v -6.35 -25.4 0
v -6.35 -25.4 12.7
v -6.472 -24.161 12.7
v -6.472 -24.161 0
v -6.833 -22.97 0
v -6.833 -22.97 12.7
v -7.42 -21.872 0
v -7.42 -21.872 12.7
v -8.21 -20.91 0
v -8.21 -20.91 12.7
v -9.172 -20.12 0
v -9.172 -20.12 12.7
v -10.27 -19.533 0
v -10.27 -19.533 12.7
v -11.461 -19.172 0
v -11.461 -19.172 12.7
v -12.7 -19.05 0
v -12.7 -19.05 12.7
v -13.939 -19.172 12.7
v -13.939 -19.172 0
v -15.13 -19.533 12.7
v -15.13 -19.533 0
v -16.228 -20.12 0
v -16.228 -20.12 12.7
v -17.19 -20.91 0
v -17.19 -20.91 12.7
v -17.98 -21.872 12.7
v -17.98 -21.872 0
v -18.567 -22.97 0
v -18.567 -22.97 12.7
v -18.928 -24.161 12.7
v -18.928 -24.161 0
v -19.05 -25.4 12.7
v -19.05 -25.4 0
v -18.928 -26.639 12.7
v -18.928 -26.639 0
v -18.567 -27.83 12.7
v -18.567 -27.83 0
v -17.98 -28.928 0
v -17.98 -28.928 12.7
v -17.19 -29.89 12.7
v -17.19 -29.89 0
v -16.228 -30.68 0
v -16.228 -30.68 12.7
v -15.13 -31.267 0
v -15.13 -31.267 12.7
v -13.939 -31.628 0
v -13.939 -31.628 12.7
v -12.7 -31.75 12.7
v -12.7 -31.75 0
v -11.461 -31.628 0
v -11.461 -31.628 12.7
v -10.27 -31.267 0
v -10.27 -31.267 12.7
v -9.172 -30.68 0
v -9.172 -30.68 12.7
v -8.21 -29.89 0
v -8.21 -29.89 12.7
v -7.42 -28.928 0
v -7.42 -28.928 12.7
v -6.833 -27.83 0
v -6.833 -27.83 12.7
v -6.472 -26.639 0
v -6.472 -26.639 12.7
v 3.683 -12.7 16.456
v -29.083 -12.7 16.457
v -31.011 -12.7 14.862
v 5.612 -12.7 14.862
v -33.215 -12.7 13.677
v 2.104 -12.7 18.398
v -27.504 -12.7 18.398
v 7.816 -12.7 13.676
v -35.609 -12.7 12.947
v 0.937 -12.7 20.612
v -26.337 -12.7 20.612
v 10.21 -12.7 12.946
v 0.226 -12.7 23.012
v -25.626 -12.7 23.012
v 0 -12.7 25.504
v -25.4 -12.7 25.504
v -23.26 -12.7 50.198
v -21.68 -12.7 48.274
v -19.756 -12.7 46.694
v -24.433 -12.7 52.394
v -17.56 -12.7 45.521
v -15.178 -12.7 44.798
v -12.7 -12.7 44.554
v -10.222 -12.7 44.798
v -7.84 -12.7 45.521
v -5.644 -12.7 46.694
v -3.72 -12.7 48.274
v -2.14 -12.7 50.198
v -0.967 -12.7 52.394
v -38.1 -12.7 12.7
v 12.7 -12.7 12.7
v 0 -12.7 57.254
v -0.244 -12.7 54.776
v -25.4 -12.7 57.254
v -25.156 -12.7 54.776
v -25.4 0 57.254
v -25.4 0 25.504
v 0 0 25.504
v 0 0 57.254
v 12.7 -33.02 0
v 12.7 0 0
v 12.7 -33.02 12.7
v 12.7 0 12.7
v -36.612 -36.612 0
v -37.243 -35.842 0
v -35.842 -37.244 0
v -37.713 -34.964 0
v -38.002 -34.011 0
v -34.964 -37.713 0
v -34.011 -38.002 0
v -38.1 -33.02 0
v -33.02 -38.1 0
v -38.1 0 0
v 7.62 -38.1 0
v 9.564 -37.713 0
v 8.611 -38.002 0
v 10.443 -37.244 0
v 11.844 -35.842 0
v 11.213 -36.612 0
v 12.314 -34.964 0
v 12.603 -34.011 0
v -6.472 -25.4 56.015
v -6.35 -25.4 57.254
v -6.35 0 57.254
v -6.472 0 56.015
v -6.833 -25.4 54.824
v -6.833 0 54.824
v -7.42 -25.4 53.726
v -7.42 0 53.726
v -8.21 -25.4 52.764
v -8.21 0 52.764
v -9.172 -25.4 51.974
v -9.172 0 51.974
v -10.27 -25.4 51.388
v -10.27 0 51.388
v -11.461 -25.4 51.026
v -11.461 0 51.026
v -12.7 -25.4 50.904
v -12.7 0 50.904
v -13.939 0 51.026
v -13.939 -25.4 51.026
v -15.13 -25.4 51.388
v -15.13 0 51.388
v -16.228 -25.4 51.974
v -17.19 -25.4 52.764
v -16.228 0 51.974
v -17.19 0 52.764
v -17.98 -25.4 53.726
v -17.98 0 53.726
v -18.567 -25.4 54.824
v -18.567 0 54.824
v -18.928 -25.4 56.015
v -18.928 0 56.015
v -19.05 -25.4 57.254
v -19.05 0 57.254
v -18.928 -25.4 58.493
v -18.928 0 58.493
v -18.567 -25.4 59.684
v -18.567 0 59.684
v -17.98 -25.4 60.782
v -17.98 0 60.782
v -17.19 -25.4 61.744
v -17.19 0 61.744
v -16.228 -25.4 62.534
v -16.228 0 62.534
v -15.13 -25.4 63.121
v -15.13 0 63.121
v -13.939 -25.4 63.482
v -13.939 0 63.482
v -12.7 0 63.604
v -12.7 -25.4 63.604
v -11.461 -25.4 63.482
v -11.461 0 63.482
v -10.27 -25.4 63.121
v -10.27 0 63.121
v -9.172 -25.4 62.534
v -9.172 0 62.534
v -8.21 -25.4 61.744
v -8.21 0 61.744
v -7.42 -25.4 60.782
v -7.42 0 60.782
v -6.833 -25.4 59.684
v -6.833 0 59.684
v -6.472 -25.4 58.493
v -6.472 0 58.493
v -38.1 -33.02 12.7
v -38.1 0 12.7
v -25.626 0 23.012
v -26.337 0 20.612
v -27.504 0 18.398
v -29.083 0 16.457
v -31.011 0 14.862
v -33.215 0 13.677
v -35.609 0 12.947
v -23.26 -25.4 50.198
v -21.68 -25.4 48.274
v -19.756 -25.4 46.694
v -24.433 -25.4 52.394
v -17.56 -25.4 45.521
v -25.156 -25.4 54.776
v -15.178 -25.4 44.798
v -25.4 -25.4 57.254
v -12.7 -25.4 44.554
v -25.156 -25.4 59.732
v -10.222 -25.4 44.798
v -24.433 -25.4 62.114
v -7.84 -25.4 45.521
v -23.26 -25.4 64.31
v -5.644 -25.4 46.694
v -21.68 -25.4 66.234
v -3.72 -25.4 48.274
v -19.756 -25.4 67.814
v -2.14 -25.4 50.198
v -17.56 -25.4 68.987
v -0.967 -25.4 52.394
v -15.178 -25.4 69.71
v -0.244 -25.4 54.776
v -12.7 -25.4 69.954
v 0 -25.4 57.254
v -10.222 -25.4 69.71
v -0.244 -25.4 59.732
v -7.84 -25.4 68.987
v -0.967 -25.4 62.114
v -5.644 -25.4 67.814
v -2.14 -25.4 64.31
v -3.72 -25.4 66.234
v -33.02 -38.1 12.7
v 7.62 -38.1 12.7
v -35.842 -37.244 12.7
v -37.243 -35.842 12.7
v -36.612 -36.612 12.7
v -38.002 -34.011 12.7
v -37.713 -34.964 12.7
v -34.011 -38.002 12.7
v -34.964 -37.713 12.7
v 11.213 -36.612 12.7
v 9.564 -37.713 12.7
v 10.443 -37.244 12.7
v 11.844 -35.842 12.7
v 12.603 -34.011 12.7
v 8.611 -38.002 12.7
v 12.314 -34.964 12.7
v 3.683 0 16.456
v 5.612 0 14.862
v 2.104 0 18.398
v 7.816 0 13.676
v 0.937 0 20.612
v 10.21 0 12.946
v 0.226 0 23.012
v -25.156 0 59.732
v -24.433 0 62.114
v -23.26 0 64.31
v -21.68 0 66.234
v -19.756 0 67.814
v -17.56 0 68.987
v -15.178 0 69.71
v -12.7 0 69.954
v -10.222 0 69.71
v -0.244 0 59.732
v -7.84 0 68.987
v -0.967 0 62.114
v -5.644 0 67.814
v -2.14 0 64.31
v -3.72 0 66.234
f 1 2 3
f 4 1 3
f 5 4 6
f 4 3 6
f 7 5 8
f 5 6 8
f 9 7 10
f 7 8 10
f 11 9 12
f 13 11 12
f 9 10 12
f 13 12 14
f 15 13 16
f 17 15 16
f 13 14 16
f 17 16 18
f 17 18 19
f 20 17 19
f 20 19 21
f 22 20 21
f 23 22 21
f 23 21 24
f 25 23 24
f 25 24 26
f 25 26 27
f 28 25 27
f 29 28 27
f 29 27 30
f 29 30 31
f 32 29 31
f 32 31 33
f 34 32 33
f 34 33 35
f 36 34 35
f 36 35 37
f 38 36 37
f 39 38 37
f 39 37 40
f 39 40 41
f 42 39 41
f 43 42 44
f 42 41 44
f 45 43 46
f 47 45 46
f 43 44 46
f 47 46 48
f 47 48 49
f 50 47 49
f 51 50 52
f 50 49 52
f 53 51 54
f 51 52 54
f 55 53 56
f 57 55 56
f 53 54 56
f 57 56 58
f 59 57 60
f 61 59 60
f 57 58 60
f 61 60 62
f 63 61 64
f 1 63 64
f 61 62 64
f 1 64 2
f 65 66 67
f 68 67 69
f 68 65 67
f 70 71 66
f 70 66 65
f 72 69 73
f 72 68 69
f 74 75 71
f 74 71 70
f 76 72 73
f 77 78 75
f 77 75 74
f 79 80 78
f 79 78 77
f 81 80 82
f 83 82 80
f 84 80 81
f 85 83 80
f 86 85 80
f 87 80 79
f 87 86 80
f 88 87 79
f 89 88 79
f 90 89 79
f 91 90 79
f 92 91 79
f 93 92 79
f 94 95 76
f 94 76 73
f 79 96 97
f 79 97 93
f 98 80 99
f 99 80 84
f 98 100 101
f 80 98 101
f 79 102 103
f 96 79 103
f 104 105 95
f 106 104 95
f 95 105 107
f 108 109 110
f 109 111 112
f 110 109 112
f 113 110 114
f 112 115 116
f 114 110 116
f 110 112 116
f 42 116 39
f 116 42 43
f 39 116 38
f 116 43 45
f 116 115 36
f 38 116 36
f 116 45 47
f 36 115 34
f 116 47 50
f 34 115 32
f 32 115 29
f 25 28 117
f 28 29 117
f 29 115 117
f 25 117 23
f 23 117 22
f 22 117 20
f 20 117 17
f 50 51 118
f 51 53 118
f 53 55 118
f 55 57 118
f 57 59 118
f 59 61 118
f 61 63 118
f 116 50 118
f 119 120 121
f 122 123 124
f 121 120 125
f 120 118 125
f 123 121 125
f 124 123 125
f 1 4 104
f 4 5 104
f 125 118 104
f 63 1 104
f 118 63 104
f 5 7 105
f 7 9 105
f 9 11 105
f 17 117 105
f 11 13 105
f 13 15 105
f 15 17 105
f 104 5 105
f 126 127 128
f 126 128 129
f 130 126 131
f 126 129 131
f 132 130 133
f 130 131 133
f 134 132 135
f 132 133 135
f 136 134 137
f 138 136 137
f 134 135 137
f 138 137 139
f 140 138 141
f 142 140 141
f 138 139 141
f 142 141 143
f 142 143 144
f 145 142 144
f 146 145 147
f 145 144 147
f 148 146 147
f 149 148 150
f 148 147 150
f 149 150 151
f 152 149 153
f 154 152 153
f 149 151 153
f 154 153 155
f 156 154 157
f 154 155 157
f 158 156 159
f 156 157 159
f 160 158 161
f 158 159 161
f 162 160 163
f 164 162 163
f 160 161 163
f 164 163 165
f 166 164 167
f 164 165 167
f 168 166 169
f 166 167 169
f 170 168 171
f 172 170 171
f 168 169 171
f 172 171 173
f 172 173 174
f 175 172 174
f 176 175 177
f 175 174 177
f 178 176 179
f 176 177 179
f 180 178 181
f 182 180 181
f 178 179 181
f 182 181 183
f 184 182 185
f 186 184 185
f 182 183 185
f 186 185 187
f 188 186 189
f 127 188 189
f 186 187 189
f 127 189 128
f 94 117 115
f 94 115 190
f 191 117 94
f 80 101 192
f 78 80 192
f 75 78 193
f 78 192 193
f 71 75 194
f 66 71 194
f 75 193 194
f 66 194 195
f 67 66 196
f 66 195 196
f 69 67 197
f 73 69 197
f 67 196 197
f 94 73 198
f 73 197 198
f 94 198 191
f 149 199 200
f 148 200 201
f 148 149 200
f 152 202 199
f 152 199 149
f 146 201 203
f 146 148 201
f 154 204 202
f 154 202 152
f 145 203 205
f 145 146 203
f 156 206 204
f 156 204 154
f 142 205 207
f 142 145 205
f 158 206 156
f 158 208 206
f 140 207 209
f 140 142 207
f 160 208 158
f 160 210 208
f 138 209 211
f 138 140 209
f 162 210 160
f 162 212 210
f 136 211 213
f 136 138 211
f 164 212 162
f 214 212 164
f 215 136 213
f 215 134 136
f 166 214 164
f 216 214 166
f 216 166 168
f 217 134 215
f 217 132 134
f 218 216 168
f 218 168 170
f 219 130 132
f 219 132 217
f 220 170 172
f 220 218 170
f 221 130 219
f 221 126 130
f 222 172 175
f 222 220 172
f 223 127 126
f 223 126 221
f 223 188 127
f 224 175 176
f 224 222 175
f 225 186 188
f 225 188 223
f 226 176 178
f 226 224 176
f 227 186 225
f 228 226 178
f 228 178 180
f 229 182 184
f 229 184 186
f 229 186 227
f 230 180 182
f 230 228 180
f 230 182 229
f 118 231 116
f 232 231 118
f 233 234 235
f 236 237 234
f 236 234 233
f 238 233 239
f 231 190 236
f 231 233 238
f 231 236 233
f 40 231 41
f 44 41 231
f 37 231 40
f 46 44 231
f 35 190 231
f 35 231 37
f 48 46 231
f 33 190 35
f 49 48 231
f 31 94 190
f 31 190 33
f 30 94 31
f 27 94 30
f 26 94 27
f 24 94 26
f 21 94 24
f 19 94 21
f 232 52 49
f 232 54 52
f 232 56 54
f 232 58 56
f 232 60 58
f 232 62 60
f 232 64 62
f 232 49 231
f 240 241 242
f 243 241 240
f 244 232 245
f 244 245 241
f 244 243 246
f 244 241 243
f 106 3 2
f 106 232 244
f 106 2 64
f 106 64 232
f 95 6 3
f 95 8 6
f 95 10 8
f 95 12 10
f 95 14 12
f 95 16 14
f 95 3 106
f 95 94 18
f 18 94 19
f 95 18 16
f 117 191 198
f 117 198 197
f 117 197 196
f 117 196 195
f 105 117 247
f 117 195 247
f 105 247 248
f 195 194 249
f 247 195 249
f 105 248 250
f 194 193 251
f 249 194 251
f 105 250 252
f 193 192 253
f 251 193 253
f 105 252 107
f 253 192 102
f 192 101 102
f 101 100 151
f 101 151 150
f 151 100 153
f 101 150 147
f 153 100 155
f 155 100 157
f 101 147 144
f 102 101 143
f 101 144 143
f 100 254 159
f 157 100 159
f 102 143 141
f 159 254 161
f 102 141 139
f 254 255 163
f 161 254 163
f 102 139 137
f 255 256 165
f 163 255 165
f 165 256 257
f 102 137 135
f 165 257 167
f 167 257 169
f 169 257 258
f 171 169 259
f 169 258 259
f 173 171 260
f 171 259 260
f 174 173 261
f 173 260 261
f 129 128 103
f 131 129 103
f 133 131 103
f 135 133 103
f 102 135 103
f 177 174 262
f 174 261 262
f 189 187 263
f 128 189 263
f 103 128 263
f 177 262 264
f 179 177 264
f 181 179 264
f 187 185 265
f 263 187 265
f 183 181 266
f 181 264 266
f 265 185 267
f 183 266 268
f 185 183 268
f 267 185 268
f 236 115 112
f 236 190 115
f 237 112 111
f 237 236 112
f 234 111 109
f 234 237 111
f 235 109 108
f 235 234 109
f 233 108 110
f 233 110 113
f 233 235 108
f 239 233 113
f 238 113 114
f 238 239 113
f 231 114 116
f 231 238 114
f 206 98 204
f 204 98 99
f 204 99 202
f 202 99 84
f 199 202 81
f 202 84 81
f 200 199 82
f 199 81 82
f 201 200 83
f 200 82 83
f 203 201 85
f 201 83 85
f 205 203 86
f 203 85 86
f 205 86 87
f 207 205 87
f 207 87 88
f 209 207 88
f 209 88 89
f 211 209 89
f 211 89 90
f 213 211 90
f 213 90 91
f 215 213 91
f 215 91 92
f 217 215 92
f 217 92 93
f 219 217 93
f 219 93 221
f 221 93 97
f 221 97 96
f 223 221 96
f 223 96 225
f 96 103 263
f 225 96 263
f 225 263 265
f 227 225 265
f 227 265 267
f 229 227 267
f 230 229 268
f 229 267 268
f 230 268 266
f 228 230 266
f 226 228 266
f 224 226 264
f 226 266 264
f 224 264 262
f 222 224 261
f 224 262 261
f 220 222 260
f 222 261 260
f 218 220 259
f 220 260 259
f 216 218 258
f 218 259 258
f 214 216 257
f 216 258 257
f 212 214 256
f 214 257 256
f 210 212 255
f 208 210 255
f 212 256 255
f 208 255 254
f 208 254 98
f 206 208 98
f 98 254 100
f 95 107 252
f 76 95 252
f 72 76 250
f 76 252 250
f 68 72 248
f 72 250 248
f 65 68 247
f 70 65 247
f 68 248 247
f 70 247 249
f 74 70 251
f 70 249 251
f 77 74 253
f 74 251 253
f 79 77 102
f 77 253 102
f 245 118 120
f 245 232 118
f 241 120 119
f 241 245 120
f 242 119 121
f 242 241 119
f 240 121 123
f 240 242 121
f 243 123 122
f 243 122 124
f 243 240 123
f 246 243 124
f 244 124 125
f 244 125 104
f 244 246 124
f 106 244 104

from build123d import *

# Parameters (mm, degrees)
F1_DEPTH = 25.4
F2_DEPTH = 12.7
F0_W     = 50.8
F0_H     = 12.7
F3_DEPTH = 38.1
F4_R     = 6.35
F5_DEPTH = 12.701
F6_R     = 5.08


with BuildPart() as f1:
    # F0 (on Front) → F1 (new body)
    with BuildSketch(Plane.XZ):
        with BuildLine():
            ThreePointArc((0, 57.254138), (-12.7, 69.954138), (-25.4, 57.254138))
            Line((-25.4, 57.254138), (-19.05, 57.254138))
            ThreePointArc((-19.05, 57.254138), (-12.7, 63.604138), (-6.35, 57.254138))
            Line((-6.35, 57.254138), (0, 57.254138))
        make_face()
        with BuildLine():
            Line((-19.05, 57.254138), (-25.4, 57.254138))
            ThreePointArc((-25.4, 57.254138), (-12.7, 44.554138), (0, 57.254138))
            Line((0, 57.254138), (-6.35, 57.254138))
            ThreePointArc((-6.35, 57.254138), (-12.7, 50.904138), (-19.05, 57.254138))
        make_face()
    extrude(amount=F1_DEPTH)

    # F0 (on Front) → F2 (join)
    with BuildSketch(Plane.XZ):
        with BuildLine():
            ThreePointArc((-25.4, 25.504138), (-29.082574, 16.456638), (-38.099573, 12.7))
            Line((-38.099573, 12.7), (12.700427, 12.7))
            ThreePointArc((12.700427, 12.7), (3.682874, 16.456335), (0, 25.504138))
            Line((0, 25.504138), (0, 57.254138))
            ThreePointArc((0, 57.254138), (-12.7, 44.554138), (-25.4, 57.254138))
            Line((-25.4, 57.254138), (-25.4, 25.504138))
        make_face()
    extrude(amount=F2_DEPTH)

    # F0 (on Front) → F3 (join)
    with BuildSketch(Plane.XZ):
        with Locations((-12.699573, 6.35)):
            Rectangle(F0_W, F0_H)
    extrude(amount=F3_DEPTH)

    # F4 (on face) → F5 (cut, through all)
    with BuildSketch(Plane.XY.offset(12.7)):
        with Locations((-12.7, -25.4)):
            Circle(F4_R)
    extrude(amount=-F5_DEPTH, mode=Mode.SUBTRACT)

    # F6
    f6_edges = [f1.edges().sort_by_distance(p)[0] for p in [
        (12.700427, -38.1, 6.35),
        (-38.099573, -38.1, 6.35),
    ]]
    fillet(f6_edges, radius=F6_R)


solid = f1.part
